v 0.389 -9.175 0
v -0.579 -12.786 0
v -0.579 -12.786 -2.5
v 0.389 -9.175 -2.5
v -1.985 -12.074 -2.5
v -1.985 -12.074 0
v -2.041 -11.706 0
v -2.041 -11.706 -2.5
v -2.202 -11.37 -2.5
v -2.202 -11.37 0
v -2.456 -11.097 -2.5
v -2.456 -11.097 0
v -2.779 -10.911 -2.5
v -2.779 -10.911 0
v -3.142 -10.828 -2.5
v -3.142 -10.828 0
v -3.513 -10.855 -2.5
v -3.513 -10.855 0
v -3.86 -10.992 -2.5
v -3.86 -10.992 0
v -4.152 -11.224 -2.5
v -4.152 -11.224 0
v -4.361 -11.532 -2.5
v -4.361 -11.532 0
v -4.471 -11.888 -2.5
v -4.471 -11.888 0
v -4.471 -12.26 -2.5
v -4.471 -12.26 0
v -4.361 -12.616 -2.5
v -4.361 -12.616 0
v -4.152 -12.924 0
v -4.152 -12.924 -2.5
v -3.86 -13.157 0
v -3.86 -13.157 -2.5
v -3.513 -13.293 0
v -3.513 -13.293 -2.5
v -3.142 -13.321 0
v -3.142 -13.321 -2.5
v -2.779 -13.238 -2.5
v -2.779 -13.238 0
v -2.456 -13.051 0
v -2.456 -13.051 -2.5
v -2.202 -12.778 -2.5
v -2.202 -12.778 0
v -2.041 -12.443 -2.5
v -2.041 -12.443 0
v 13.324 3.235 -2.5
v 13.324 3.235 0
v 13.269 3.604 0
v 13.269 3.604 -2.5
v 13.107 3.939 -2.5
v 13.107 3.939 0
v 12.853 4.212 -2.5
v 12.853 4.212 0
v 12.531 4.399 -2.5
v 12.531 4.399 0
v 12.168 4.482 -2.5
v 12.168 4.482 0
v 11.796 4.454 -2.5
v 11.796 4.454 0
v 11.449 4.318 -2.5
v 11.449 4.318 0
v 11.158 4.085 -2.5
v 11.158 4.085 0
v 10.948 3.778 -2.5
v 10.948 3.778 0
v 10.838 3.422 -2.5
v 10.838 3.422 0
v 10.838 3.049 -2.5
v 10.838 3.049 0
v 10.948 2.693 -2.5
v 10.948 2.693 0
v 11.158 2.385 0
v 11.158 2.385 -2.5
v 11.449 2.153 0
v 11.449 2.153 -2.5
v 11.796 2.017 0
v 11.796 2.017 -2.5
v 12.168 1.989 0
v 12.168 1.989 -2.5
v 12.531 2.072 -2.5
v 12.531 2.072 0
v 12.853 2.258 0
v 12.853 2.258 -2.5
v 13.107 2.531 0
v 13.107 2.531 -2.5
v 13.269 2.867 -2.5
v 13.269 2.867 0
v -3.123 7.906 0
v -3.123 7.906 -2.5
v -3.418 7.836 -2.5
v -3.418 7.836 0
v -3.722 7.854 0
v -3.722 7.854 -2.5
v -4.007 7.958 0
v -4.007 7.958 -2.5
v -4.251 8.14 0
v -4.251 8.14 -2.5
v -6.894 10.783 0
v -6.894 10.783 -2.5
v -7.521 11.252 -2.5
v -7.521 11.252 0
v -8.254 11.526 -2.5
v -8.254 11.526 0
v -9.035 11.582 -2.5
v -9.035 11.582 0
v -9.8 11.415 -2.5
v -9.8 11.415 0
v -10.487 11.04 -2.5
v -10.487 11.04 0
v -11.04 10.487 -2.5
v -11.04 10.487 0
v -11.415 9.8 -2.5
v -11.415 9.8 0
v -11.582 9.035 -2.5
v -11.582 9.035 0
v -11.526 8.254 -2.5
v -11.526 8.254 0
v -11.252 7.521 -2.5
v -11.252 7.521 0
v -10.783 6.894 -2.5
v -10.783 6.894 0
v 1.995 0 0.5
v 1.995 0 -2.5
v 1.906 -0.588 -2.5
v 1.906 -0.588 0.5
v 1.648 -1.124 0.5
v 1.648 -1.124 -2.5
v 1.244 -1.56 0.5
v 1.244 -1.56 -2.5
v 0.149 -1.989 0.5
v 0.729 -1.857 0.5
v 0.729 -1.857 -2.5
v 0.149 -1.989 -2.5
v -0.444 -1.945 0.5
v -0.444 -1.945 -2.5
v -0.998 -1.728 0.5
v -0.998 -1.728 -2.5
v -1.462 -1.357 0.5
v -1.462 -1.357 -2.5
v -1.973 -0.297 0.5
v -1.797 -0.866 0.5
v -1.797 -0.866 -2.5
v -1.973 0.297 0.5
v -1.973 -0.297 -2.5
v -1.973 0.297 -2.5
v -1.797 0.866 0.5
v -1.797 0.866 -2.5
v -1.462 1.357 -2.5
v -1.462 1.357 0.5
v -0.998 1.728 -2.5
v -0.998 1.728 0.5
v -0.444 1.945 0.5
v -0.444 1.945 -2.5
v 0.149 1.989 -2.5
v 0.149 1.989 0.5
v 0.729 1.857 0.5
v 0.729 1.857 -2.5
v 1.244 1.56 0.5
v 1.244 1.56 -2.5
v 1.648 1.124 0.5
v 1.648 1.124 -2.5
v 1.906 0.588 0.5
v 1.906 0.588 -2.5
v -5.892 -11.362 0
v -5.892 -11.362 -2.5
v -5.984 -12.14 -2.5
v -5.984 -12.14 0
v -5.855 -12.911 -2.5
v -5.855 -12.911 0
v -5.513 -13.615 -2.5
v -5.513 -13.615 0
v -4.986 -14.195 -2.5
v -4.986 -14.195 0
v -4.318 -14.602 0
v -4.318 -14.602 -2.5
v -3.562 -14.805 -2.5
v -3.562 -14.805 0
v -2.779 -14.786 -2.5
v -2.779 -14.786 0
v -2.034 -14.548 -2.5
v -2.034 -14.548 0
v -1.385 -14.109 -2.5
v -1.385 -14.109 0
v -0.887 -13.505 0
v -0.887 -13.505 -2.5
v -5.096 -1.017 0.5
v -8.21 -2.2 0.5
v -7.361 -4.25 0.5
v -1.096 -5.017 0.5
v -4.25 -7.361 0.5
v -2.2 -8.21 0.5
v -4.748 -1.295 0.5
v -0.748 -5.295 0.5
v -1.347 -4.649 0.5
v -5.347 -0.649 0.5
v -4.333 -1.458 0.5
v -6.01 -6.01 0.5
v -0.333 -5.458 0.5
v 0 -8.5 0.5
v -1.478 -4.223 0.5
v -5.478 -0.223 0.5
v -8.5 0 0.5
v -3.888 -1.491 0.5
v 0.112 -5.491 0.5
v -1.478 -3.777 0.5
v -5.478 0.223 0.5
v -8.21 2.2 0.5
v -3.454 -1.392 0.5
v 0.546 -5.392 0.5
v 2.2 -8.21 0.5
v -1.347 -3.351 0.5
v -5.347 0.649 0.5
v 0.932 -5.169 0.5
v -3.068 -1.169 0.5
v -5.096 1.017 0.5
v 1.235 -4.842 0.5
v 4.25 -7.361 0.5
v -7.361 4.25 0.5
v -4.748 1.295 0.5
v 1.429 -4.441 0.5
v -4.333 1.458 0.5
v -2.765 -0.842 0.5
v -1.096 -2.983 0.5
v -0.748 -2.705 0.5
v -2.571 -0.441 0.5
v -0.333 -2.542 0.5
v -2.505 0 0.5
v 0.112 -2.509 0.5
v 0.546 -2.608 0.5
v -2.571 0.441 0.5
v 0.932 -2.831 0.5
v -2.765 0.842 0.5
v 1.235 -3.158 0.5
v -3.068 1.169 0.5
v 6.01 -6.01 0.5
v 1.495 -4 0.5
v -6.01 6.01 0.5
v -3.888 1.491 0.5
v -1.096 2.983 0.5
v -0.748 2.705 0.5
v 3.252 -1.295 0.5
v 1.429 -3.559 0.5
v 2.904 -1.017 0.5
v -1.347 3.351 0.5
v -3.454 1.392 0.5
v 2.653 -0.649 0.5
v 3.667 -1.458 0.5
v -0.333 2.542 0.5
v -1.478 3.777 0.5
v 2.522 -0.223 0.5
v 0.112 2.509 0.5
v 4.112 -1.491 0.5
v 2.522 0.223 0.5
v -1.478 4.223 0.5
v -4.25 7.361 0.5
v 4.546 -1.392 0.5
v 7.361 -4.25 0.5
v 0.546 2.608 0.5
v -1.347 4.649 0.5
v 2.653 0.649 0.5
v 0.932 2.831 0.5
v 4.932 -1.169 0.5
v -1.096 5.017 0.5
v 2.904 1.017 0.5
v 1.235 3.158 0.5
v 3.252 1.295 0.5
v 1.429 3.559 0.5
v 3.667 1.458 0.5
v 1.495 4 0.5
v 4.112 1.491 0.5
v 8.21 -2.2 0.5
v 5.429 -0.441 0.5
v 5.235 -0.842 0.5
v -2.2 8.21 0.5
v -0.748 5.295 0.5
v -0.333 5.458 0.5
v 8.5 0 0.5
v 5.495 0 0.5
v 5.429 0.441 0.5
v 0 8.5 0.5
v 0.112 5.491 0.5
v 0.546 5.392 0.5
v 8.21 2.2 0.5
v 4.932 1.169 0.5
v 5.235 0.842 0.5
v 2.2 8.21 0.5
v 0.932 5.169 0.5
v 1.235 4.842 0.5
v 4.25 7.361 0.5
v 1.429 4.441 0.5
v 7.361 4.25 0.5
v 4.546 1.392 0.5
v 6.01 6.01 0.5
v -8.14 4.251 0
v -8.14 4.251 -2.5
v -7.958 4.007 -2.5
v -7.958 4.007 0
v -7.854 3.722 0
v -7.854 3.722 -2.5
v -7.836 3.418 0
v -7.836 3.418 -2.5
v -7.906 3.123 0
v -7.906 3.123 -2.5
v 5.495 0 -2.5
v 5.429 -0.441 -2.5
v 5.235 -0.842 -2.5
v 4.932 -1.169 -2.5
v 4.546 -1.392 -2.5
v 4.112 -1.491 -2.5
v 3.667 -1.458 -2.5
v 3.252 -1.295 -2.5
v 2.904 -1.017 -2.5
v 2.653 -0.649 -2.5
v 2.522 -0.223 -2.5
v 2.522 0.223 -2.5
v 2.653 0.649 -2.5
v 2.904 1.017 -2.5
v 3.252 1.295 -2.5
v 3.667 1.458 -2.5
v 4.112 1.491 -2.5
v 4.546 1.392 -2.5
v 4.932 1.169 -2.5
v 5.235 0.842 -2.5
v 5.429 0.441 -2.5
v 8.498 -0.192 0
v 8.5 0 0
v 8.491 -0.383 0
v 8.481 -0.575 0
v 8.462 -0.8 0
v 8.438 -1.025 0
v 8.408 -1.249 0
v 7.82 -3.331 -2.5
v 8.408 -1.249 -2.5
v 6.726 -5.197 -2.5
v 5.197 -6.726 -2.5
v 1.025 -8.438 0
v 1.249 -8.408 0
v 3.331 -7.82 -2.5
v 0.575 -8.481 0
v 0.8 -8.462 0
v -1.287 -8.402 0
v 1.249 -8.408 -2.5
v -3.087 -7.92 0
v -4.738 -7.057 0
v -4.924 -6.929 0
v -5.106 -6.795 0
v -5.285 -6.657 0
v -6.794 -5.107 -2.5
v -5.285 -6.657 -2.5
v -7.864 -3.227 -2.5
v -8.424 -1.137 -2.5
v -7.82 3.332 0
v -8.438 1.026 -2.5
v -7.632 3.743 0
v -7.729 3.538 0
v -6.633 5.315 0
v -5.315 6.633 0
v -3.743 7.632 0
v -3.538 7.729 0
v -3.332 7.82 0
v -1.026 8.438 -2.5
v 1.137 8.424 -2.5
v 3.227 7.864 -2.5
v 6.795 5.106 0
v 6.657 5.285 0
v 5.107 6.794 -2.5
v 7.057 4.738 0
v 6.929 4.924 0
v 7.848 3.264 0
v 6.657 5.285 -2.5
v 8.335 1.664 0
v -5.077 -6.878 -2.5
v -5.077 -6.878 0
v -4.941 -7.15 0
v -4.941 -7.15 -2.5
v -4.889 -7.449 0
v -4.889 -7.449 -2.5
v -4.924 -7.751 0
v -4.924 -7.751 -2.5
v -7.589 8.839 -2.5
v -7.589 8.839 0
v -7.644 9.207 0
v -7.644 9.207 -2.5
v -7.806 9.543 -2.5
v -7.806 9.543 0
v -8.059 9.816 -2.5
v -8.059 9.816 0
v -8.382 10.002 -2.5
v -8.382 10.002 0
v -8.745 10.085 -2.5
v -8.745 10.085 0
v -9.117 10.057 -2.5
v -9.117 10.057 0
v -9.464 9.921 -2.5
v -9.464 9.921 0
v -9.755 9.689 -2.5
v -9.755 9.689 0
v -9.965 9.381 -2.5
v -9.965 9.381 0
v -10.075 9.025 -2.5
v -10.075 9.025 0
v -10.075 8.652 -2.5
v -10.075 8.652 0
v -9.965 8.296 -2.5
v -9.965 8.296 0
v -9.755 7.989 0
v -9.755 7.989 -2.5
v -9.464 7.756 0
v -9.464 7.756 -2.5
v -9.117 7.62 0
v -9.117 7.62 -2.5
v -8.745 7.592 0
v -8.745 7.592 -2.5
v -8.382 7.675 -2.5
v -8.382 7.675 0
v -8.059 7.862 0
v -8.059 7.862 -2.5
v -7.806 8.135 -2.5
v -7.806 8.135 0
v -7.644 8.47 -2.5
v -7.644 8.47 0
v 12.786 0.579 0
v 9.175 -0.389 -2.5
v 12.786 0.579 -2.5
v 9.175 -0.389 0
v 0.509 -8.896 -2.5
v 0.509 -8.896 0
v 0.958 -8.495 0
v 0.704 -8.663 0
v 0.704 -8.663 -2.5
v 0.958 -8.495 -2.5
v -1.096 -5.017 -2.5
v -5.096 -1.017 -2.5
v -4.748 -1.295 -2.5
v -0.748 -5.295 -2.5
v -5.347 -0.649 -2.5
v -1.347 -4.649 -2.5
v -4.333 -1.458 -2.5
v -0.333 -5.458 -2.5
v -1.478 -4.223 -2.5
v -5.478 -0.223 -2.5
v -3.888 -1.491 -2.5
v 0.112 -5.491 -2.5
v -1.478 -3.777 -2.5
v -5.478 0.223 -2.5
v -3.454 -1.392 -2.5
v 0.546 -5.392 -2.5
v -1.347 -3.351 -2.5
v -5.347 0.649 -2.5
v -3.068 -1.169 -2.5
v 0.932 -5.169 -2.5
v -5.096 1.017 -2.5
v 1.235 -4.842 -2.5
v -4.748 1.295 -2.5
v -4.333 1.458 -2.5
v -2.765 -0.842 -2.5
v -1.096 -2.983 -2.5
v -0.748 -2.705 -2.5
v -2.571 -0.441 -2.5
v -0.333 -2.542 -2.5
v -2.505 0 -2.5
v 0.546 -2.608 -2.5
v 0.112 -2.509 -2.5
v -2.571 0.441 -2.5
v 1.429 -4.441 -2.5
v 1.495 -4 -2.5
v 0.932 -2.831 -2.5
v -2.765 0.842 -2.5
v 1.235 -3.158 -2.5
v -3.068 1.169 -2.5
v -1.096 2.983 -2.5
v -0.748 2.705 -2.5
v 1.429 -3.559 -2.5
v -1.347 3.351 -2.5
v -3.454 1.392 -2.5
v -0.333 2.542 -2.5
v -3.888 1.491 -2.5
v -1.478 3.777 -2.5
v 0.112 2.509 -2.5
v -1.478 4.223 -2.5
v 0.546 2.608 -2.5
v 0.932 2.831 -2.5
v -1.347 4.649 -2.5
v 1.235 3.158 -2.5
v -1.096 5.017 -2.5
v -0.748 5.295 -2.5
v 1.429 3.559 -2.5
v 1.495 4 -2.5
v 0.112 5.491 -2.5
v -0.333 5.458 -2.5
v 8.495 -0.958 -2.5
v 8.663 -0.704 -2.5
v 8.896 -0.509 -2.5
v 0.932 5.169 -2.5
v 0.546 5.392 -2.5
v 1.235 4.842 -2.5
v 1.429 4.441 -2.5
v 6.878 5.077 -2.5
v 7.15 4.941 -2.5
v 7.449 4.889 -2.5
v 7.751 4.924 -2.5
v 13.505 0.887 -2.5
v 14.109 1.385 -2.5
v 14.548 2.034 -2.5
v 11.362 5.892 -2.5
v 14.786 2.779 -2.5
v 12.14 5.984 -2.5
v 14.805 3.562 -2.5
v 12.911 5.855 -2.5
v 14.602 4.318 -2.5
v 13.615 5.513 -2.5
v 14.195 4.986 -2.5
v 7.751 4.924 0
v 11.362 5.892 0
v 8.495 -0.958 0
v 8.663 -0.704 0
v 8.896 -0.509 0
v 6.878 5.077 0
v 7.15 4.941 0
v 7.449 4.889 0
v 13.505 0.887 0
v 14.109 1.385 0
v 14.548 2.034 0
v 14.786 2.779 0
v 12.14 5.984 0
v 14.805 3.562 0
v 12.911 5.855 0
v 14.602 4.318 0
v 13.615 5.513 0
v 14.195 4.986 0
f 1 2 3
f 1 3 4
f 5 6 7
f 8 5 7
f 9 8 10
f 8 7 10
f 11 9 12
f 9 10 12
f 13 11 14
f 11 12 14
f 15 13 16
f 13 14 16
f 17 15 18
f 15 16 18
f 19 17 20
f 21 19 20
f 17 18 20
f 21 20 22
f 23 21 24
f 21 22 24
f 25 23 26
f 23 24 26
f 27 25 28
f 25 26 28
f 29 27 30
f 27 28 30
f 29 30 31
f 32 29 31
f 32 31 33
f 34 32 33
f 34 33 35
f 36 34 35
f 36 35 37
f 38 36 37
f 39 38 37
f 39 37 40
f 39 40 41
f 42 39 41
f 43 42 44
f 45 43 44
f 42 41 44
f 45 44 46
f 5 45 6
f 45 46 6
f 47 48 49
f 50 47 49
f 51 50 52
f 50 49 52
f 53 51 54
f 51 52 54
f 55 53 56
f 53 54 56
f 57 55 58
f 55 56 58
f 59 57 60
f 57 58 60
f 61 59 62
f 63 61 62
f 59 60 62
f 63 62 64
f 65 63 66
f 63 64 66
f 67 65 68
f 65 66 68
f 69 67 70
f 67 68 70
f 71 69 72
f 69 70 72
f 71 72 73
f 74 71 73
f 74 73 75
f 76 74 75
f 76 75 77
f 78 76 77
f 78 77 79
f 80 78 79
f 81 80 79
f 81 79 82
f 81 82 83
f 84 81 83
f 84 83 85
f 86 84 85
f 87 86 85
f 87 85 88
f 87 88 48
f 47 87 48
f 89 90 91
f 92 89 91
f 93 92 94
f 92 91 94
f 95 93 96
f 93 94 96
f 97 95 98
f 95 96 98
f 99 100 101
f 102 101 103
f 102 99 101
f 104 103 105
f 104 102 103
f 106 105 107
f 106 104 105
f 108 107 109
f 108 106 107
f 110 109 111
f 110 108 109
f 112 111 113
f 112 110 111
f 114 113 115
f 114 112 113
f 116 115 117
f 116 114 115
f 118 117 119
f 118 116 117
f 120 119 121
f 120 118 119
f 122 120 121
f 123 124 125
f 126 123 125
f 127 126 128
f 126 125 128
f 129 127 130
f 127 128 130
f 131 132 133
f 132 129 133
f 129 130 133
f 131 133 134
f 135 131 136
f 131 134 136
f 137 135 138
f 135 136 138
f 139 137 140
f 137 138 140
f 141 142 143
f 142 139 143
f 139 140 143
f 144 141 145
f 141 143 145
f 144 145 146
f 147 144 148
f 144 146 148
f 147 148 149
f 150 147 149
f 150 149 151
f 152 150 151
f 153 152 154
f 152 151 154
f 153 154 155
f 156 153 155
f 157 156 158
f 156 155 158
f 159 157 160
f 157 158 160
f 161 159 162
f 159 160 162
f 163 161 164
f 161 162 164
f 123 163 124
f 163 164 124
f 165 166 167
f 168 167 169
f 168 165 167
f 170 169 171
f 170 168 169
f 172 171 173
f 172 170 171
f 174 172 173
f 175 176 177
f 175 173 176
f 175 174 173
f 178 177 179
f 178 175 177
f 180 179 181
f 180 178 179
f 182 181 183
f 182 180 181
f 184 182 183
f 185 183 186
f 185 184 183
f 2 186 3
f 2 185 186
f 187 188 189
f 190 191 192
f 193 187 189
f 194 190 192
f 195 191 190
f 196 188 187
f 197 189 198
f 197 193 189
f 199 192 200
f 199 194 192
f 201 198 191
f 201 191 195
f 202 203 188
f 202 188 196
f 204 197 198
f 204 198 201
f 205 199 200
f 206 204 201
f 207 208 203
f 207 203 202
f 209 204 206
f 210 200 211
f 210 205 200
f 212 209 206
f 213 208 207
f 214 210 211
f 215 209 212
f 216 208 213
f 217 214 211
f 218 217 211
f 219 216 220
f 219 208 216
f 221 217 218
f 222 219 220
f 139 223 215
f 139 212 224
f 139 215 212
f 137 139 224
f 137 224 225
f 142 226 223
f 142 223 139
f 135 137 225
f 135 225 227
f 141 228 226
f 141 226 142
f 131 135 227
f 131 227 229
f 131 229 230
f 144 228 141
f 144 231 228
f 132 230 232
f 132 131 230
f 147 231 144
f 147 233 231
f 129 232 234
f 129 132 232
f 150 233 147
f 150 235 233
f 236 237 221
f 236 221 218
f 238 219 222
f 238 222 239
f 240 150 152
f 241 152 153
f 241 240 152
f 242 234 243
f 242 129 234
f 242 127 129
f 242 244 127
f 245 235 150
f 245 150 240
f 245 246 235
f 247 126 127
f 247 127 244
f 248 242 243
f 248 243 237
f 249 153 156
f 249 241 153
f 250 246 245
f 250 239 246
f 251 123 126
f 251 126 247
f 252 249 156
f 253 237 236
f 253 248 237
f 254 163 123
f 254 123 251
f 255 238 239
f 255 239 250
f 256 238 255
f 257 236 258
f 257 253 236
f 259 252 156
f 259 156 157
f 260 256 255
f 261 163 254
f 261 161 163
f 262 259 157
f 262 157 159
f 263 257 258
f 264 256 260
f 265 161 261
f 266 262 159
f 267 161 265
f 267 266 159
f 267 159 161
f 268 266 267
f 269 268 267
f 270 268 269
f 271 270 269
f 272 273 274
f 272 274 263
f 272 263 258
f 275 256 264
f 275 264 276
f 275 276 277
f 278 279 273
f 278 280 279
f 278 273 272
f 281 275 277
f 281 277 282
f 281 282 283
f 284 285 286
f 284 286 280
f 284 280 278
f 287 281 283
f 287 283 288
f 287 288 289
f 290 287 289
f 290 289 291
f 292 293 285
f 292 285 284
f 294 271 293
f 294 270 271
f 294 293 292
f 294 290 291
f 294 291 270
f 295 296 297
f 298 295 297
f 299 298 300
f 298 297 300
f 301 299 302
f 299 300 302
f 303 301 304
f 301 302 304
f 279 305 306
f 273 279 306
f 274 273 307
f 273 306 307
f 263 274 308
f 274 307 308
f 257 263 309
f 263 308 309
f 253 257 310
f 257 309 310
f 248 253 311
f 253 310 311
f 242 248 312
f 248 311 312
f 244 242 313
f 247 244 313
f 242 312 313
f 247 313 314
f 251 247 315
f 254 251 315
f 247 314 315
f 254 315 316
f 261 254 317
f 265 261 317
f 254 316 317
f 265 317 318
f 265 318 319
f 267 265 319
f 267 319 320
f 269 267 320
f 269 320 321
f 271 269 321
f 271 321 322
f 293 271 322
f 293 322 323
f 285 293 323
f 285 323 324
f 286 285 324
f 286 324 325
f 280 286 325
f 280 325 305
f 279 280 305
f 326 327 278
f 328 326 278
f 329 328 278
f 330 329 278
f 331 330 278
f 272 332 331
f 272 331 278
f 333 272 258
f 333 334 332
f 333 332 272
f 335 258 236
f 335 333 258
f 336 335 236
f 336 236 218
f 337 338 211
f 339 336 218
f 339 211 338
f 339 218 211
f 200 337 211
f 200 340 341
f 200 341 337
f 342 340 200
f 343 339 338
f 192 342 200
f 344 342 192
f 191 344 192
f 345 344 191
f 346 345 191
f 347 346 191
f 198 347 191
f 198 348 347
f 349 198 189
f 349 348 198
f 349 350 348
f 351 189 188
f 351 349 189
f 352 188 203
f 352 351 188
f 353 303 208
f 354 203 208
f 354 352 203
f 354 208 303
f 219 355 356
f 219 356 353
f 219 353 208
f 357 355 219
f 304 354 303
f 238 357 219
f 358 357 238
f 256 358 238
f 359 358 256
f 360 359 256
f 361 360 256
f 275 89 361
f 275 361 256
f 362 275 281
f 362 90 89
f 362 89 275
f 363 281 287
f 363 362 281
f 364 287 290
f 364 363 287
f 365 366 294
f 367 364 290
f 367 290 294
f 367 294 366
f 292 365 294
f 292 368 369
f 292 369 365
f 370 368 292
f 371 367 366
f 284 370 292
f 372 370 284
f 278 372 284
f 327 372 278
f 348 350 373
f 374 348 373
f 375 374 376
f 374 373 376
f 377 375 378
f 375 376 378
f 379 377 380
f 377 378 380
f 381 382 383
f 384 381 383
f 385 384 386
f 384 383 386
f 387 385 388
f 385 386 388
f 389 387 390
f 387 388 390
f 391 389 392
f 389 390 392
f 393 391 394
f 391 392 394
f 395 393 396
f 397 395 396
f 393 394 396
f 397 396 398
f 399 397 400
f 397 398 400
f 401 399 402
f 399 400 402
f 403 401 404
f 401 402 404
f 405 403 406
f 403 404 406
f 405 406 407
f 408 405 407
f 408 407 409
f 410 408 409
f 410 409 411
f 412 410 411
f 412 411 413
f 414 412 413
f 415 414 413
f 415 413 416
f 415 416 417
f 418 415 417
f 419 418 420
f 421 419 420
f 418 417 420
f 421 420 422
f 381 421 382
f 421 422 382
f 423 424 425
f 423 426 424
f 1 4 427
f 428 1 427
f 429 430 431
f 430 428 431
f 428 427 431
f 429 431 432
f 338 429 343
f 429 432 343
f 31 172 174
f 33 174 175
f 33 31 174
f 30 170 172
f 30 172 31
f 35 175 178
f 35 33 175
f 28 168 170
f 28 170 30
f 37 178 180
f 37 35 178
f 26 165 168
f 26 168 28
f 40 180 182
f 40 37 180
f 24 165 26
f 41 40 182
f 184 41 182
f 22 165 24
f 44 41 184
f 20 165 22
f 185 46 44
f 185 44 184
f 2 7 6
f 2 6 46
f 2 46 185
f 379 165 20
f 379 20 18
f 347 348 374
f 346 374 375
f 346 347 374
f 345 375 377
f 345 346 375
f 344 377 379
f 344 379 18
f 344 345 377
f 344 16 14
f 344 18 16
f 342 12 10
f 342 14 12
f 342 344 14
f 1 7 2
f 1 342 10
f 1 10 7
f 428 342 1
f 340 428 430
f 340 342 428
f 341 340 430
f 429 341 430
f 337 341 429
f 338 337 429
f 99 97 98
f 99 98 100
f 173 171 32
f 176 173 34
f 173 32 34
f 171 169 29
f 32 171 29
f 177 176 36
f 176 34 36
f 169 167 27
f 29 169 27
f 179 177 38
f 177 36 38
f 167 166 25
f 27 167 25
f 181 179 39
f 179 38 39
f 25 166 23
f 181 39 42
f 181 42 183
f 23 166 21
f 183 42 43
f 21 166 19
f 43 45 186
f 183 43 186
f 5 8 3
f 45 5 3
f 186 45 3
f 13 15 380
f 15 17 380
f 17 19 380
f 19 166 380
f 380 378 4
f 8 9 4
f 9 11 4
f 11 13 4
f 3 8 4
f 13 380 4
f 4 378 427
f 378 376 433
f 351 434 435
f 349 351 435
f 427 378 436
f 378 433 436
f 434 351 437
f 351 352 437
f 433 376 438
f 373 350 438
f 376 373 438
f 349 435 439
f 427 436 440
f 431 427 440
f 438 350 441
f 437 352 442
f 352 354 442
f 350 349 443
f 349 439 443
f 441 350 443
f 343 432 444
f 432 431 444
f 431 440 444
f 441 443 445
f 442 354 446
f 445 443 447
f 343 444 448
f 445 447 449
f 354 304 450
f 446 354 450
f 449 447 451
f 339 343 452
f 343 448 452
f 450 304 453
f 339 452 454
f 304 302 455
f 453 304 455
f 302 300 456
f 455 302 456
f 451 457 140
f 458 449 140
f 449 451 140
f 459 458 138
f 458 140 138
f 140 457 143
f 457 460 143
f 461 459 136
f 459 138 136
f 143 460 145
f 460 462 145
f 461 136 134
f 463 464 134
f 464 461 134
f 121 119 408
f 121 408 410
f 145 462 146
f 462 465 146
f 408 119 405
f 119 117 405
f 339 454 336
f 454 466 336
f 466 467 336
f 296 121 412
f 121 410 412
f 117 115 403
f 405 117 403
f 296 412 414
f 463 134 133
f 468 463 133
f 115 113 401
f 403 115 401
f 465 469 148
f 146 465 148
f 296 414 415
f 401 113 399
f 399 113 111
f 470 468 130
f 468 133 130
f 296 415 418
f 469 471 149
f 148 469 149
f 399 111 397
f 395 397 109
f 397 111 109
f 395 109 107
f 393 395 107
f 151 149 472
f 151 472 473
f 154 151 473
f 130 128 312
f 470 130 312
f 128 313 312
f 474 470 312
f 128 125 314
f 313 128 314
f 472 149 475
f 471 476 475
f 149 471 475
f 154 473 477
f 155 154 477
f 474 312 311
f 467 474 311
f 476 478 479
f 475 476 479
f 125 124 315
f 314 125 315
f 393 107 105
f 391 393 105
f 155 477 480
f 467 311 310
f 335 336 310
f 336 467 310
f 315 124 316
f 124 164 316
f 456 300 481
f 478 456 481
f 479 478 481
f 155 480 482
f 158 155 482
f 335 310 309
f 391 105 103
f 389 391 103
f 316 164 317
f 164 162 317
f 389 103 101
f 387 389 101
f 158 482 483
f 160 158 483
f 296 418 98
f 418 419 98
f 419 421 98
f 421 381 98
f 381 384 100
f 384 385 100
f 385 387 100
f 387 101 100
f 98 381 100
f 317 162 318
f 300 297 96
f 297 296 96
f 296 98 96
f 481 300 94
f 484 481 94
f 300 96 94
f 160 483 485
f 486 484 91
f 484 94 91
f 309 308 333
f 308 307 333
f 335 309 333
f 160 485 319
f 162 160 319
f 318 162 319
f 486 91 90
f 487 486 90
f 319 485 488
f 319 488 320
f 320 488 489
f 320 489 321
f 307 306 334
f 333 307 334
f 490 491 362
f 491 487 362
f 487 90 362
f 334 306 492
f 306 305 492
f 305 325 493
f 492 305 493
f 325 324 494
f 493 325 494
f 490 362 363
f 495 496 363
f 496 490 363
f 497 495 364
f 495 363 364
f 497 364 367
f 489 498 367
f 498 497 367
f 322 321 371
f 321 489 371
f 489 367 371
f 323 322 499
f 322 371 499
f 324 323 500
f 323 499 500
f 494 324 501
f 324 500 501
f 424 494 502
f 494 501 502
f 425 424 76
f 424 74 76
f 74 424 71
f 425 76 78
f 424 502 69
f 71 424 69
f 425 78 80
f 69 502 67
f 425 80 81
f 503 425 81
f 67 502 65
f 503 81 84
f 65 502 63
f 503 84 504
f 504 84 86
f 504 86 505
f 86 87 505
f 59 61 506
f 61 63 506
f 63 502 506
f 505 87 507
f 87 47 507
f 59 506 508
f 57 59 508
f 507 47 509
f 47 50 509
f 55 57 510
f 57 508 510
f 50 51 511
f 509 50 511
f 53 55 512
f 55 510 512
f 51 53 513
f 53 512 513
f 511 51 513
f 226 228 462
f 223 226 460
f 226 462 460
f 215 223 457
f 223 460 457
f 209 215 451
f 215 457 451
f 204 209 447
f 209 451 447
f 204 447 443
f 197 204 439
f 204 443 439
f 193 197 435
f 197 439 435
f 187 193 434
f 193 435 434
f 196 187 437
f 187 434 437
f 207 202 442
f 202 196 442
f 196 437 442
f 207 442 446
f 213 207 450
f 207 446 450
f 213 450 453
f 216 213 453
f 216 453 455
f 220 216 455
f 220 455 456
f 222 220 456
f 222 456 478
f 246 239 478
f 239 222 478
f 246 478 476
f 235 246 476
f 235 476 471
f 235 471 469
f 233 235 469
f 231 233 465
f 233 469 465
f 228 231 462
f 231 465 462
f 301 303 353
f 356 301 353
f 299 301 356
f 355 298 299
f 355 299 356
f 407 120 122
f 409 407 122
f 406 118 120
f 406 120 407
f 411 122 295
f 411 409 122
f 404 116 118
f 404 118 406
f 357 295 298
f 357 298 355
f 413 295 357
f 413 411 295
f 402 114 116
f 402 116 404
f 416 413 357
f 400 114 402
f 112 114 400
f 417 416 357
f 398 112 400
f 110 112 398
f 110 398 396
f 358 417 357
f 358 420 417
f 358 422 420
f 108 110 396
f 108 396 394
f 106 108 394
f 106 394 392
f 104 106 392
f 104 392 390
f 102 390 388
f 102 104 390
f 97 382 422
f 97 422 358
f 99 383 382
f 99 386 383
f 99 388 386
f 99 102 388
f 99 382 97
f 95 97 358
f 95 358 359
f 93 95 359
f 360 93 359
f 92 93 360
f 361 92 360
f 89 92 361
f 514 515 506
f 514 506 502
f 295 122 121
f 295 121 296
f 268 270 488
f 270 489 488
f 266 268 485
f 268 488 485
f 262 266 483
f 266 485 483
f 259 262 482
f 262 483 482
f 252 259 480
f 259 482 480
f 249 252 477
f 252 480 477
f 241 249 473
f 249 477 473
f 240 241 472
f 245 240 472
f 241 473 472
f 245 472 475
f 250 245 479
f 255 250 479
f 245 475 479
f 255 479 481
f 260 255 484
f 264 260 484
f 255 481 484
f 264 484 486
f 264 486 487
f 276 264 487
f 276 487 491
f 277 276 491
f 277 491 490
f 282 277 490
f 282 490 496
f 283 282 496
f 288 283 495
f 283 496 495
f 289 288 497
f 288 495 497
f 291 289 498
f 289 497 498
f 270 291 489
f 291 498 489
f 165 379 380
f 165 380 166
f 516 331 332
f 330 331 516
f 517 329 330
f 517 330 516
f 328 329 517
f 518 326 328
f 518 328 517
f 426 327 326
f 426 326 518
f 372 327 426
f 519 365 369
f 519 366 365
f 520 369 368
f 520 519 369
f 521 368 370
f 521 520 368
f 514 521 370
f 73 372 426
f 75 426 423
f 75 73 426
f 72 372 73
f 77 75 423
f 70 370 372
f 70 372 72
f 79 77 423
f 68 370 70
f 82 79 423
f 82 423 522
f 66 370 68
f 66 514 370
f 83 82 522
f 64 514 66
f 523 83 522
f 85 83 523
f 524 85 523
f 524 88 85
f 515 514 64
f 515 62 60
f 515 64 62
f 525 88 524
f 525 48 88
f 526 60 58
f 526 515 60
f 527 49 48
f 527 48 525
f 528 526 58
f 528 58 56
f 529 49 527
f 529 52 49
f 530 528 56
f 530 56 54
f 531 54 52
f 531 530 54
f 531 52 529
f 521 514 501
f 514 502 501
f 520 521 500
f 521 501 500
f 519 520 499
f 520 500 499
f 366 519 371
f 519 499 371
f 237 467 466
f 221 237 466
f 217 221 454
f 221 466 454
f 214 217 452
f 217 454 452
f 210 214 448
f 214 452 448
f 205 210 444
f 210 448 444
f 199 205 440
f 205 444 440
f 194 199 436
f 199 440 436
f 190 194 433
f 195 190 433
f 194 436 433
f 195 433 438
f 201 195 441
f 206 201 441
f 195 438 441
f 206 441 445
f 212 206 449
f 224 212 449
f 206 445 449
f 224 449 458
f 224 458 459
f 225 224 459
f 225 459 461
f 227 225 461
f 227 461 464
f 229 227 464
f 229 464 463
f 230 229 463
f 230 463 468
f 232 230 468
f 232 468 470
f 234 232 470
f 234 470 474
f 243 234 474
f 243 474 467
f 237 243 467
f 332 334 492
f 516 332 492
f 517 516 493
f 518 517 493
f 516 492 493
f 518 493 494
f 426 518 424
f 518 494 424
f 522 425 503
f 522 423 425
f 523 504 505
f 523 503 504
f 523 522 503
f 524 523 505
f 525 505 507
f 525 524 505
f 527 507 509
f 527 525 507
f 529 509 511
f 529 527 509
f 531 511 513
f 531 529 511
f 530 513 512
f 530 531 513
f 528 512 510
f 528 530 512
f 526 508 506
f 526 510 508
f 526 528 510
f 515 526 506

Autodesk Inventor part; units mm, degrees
ref_plane "YZ Plane" through (0, 0, 0) normal (1, 0, 0) x (0, 1, 0)
ref_plane "XZ Plane" through (0, 0, 0) normal (0, 1, 0) x (-1, 0, 0)
ref_plane "XY Plane" through (0, 0, 0) normal (0, 0, 1) x (1, 0, 0)
sketch "スケッチ1" plane through (0, 0, 0) normal (0, 0, 1) x (1, 0, 0)
  line L0 (0, 0) -> (-4, 0) construction
  circle A0 centre (-4, 0) radius 1.495
  line L1 (0, 0) -> (0, -4) construction
  circle A1 centre (0, -4) radius 1.495
  line L2 (0, 0) -> (4, 0) construction
  circle A2 centre (4, 0) radius 1.495
  line L3 (0, 0) -> (0, 4) construction
  circle A3 centre (0, 4) radius 1.495
  line L4 (0, 0) -> (-8.8388, 8.8388) construction
  circle A4 centre (-8.8388, 8.8388) radius 1.25
  line L5 (0, 0) -> (-3.2352, -12.0741) construction
  circle A5 centre (-3.2352, -12.0741) radius 1.25
  line L6 (0, 0) -> (12.0741, 3.2352) construction
  circle A6 centre (12.0741, 3.2352) radius 1.25
  circle A7 centre (0, 0) radius 8.5
  circle A8 centre (0, 0) radius 15.25
  circle A9 centre (0, 0) radius 1.995
  line L7 (0, 0) -> (-8.8388, 8.8388) construction
  line L8 (1.9445, 1.9445) -> (-6.8943, 10.7834)
  line L9 (-10.7834, 6.8943) -> (-1.9445, -1.9445)
  arc A10 (-1.9445, -1.9445) -> (1.9445, 1.9445) centre (0, 0) ccw
  arc A11 (-6.8943, 10.7834) -> (-10.7834, 6.8943) centre (-8.8388, 8.8388) ccw
  arc A12 (-5.8915, -11.3623) -> (-0.5789, -12.7858) centre (-3.2352, -12.0741) ccw
  line L10 (-2.6563, 0.7118) -> (-5.8915, -11.3623)
  line L11 (-0.5789, -12.7858) -> (2.6563, -0.7118)
  arc A13 (12.7858, 0.5789) -> (11.3623, 5.8915) centre (12.0741, 3.2352) ccw
  line L12 (0.7118, -2.6563) -> (12.7858, 0.5789)
  line L13 (11.3623, 5.8915) -> (-0.7118, 2.6563)
  point P0 (-4.4194, 4.4194)
  point P1 (-7.6317, 3.7426)
  point P2 (-4.7379, -7.057)
  point P3 (0.5747, -8.4806)
  point P4 (8.4806, -0.5747)
  point P5 (7.057, 4.7379)
  point P6 (-3.7426, 7.6317)
  dimension "d0" = 4
  dimension "d1" = 2.99
  dimension "d4" = 360
  dimension "d6" = 12.5
  dimension "d7" = 2.5
  dimension "d8" = 45
  dimension "d11" = 360
  dimension "d13" = 3.005
  dimension "d14" = 17
  dimension "d15" = 1.5
  dimension "d16" = 3.99
  dimension "d31" = 5.5
  dimension "d34" = 360
extrude "押し出し1" add sketch "スケッチ1" along normal blind 0.5 contours A0 L9 A7 L8 A3 A10 A2 A1 | L9 A10 A1 L12 L11 A7 L10 A0 | A0 L10 A7 L9 | A7 L13 A3 L8 | L11 L12 A7 | A7 L12 L11 A10 A2 L8 A3 L13 | L12 A10 L11
extrude "押し出し3" add sketch "スケッチ1" against normal blind 2.5 contours A0 L9 A7 L8 A3 A10 A2 A1 | L9 A10 A1 L12 L11 A7 L10 A0 | A0 L10 A7 L9 | L9 A11 L8 A7 | A7 L11 A12 L10 | A7 L13 A3 L8 | L11 L12 A7 | L13 A13 L12 A7 | A7 L12 L11 A10 A2 L8 A3 L13 | L12 A10 L11
thread "ねじ1" size "M3x0.5" class "6H" standard "ANSI Metric M Profile" full length
thread "ねじ2" size "M3x0.5" class "6H" standard "ANSI Metric M Profile" full length
thread "ねじ3" size "M3x0.5" class "6H" standard "ANSI Metric M Profile" full length
fillet "フィレット1" radius 1.05 6 edges at (-7.6317, 3.7426, -1.25) (-4.7379, -7.057, -1.25) (-3.7426, 7.6317, -1.25) (7.057, 4.7379, -1.25) (8.4806, -0.5747, -1.25) (0.5747, -8.4806, -1.25)
properties part number "脚中間フレームカム3" material "アルミニウム 2014-T4"
